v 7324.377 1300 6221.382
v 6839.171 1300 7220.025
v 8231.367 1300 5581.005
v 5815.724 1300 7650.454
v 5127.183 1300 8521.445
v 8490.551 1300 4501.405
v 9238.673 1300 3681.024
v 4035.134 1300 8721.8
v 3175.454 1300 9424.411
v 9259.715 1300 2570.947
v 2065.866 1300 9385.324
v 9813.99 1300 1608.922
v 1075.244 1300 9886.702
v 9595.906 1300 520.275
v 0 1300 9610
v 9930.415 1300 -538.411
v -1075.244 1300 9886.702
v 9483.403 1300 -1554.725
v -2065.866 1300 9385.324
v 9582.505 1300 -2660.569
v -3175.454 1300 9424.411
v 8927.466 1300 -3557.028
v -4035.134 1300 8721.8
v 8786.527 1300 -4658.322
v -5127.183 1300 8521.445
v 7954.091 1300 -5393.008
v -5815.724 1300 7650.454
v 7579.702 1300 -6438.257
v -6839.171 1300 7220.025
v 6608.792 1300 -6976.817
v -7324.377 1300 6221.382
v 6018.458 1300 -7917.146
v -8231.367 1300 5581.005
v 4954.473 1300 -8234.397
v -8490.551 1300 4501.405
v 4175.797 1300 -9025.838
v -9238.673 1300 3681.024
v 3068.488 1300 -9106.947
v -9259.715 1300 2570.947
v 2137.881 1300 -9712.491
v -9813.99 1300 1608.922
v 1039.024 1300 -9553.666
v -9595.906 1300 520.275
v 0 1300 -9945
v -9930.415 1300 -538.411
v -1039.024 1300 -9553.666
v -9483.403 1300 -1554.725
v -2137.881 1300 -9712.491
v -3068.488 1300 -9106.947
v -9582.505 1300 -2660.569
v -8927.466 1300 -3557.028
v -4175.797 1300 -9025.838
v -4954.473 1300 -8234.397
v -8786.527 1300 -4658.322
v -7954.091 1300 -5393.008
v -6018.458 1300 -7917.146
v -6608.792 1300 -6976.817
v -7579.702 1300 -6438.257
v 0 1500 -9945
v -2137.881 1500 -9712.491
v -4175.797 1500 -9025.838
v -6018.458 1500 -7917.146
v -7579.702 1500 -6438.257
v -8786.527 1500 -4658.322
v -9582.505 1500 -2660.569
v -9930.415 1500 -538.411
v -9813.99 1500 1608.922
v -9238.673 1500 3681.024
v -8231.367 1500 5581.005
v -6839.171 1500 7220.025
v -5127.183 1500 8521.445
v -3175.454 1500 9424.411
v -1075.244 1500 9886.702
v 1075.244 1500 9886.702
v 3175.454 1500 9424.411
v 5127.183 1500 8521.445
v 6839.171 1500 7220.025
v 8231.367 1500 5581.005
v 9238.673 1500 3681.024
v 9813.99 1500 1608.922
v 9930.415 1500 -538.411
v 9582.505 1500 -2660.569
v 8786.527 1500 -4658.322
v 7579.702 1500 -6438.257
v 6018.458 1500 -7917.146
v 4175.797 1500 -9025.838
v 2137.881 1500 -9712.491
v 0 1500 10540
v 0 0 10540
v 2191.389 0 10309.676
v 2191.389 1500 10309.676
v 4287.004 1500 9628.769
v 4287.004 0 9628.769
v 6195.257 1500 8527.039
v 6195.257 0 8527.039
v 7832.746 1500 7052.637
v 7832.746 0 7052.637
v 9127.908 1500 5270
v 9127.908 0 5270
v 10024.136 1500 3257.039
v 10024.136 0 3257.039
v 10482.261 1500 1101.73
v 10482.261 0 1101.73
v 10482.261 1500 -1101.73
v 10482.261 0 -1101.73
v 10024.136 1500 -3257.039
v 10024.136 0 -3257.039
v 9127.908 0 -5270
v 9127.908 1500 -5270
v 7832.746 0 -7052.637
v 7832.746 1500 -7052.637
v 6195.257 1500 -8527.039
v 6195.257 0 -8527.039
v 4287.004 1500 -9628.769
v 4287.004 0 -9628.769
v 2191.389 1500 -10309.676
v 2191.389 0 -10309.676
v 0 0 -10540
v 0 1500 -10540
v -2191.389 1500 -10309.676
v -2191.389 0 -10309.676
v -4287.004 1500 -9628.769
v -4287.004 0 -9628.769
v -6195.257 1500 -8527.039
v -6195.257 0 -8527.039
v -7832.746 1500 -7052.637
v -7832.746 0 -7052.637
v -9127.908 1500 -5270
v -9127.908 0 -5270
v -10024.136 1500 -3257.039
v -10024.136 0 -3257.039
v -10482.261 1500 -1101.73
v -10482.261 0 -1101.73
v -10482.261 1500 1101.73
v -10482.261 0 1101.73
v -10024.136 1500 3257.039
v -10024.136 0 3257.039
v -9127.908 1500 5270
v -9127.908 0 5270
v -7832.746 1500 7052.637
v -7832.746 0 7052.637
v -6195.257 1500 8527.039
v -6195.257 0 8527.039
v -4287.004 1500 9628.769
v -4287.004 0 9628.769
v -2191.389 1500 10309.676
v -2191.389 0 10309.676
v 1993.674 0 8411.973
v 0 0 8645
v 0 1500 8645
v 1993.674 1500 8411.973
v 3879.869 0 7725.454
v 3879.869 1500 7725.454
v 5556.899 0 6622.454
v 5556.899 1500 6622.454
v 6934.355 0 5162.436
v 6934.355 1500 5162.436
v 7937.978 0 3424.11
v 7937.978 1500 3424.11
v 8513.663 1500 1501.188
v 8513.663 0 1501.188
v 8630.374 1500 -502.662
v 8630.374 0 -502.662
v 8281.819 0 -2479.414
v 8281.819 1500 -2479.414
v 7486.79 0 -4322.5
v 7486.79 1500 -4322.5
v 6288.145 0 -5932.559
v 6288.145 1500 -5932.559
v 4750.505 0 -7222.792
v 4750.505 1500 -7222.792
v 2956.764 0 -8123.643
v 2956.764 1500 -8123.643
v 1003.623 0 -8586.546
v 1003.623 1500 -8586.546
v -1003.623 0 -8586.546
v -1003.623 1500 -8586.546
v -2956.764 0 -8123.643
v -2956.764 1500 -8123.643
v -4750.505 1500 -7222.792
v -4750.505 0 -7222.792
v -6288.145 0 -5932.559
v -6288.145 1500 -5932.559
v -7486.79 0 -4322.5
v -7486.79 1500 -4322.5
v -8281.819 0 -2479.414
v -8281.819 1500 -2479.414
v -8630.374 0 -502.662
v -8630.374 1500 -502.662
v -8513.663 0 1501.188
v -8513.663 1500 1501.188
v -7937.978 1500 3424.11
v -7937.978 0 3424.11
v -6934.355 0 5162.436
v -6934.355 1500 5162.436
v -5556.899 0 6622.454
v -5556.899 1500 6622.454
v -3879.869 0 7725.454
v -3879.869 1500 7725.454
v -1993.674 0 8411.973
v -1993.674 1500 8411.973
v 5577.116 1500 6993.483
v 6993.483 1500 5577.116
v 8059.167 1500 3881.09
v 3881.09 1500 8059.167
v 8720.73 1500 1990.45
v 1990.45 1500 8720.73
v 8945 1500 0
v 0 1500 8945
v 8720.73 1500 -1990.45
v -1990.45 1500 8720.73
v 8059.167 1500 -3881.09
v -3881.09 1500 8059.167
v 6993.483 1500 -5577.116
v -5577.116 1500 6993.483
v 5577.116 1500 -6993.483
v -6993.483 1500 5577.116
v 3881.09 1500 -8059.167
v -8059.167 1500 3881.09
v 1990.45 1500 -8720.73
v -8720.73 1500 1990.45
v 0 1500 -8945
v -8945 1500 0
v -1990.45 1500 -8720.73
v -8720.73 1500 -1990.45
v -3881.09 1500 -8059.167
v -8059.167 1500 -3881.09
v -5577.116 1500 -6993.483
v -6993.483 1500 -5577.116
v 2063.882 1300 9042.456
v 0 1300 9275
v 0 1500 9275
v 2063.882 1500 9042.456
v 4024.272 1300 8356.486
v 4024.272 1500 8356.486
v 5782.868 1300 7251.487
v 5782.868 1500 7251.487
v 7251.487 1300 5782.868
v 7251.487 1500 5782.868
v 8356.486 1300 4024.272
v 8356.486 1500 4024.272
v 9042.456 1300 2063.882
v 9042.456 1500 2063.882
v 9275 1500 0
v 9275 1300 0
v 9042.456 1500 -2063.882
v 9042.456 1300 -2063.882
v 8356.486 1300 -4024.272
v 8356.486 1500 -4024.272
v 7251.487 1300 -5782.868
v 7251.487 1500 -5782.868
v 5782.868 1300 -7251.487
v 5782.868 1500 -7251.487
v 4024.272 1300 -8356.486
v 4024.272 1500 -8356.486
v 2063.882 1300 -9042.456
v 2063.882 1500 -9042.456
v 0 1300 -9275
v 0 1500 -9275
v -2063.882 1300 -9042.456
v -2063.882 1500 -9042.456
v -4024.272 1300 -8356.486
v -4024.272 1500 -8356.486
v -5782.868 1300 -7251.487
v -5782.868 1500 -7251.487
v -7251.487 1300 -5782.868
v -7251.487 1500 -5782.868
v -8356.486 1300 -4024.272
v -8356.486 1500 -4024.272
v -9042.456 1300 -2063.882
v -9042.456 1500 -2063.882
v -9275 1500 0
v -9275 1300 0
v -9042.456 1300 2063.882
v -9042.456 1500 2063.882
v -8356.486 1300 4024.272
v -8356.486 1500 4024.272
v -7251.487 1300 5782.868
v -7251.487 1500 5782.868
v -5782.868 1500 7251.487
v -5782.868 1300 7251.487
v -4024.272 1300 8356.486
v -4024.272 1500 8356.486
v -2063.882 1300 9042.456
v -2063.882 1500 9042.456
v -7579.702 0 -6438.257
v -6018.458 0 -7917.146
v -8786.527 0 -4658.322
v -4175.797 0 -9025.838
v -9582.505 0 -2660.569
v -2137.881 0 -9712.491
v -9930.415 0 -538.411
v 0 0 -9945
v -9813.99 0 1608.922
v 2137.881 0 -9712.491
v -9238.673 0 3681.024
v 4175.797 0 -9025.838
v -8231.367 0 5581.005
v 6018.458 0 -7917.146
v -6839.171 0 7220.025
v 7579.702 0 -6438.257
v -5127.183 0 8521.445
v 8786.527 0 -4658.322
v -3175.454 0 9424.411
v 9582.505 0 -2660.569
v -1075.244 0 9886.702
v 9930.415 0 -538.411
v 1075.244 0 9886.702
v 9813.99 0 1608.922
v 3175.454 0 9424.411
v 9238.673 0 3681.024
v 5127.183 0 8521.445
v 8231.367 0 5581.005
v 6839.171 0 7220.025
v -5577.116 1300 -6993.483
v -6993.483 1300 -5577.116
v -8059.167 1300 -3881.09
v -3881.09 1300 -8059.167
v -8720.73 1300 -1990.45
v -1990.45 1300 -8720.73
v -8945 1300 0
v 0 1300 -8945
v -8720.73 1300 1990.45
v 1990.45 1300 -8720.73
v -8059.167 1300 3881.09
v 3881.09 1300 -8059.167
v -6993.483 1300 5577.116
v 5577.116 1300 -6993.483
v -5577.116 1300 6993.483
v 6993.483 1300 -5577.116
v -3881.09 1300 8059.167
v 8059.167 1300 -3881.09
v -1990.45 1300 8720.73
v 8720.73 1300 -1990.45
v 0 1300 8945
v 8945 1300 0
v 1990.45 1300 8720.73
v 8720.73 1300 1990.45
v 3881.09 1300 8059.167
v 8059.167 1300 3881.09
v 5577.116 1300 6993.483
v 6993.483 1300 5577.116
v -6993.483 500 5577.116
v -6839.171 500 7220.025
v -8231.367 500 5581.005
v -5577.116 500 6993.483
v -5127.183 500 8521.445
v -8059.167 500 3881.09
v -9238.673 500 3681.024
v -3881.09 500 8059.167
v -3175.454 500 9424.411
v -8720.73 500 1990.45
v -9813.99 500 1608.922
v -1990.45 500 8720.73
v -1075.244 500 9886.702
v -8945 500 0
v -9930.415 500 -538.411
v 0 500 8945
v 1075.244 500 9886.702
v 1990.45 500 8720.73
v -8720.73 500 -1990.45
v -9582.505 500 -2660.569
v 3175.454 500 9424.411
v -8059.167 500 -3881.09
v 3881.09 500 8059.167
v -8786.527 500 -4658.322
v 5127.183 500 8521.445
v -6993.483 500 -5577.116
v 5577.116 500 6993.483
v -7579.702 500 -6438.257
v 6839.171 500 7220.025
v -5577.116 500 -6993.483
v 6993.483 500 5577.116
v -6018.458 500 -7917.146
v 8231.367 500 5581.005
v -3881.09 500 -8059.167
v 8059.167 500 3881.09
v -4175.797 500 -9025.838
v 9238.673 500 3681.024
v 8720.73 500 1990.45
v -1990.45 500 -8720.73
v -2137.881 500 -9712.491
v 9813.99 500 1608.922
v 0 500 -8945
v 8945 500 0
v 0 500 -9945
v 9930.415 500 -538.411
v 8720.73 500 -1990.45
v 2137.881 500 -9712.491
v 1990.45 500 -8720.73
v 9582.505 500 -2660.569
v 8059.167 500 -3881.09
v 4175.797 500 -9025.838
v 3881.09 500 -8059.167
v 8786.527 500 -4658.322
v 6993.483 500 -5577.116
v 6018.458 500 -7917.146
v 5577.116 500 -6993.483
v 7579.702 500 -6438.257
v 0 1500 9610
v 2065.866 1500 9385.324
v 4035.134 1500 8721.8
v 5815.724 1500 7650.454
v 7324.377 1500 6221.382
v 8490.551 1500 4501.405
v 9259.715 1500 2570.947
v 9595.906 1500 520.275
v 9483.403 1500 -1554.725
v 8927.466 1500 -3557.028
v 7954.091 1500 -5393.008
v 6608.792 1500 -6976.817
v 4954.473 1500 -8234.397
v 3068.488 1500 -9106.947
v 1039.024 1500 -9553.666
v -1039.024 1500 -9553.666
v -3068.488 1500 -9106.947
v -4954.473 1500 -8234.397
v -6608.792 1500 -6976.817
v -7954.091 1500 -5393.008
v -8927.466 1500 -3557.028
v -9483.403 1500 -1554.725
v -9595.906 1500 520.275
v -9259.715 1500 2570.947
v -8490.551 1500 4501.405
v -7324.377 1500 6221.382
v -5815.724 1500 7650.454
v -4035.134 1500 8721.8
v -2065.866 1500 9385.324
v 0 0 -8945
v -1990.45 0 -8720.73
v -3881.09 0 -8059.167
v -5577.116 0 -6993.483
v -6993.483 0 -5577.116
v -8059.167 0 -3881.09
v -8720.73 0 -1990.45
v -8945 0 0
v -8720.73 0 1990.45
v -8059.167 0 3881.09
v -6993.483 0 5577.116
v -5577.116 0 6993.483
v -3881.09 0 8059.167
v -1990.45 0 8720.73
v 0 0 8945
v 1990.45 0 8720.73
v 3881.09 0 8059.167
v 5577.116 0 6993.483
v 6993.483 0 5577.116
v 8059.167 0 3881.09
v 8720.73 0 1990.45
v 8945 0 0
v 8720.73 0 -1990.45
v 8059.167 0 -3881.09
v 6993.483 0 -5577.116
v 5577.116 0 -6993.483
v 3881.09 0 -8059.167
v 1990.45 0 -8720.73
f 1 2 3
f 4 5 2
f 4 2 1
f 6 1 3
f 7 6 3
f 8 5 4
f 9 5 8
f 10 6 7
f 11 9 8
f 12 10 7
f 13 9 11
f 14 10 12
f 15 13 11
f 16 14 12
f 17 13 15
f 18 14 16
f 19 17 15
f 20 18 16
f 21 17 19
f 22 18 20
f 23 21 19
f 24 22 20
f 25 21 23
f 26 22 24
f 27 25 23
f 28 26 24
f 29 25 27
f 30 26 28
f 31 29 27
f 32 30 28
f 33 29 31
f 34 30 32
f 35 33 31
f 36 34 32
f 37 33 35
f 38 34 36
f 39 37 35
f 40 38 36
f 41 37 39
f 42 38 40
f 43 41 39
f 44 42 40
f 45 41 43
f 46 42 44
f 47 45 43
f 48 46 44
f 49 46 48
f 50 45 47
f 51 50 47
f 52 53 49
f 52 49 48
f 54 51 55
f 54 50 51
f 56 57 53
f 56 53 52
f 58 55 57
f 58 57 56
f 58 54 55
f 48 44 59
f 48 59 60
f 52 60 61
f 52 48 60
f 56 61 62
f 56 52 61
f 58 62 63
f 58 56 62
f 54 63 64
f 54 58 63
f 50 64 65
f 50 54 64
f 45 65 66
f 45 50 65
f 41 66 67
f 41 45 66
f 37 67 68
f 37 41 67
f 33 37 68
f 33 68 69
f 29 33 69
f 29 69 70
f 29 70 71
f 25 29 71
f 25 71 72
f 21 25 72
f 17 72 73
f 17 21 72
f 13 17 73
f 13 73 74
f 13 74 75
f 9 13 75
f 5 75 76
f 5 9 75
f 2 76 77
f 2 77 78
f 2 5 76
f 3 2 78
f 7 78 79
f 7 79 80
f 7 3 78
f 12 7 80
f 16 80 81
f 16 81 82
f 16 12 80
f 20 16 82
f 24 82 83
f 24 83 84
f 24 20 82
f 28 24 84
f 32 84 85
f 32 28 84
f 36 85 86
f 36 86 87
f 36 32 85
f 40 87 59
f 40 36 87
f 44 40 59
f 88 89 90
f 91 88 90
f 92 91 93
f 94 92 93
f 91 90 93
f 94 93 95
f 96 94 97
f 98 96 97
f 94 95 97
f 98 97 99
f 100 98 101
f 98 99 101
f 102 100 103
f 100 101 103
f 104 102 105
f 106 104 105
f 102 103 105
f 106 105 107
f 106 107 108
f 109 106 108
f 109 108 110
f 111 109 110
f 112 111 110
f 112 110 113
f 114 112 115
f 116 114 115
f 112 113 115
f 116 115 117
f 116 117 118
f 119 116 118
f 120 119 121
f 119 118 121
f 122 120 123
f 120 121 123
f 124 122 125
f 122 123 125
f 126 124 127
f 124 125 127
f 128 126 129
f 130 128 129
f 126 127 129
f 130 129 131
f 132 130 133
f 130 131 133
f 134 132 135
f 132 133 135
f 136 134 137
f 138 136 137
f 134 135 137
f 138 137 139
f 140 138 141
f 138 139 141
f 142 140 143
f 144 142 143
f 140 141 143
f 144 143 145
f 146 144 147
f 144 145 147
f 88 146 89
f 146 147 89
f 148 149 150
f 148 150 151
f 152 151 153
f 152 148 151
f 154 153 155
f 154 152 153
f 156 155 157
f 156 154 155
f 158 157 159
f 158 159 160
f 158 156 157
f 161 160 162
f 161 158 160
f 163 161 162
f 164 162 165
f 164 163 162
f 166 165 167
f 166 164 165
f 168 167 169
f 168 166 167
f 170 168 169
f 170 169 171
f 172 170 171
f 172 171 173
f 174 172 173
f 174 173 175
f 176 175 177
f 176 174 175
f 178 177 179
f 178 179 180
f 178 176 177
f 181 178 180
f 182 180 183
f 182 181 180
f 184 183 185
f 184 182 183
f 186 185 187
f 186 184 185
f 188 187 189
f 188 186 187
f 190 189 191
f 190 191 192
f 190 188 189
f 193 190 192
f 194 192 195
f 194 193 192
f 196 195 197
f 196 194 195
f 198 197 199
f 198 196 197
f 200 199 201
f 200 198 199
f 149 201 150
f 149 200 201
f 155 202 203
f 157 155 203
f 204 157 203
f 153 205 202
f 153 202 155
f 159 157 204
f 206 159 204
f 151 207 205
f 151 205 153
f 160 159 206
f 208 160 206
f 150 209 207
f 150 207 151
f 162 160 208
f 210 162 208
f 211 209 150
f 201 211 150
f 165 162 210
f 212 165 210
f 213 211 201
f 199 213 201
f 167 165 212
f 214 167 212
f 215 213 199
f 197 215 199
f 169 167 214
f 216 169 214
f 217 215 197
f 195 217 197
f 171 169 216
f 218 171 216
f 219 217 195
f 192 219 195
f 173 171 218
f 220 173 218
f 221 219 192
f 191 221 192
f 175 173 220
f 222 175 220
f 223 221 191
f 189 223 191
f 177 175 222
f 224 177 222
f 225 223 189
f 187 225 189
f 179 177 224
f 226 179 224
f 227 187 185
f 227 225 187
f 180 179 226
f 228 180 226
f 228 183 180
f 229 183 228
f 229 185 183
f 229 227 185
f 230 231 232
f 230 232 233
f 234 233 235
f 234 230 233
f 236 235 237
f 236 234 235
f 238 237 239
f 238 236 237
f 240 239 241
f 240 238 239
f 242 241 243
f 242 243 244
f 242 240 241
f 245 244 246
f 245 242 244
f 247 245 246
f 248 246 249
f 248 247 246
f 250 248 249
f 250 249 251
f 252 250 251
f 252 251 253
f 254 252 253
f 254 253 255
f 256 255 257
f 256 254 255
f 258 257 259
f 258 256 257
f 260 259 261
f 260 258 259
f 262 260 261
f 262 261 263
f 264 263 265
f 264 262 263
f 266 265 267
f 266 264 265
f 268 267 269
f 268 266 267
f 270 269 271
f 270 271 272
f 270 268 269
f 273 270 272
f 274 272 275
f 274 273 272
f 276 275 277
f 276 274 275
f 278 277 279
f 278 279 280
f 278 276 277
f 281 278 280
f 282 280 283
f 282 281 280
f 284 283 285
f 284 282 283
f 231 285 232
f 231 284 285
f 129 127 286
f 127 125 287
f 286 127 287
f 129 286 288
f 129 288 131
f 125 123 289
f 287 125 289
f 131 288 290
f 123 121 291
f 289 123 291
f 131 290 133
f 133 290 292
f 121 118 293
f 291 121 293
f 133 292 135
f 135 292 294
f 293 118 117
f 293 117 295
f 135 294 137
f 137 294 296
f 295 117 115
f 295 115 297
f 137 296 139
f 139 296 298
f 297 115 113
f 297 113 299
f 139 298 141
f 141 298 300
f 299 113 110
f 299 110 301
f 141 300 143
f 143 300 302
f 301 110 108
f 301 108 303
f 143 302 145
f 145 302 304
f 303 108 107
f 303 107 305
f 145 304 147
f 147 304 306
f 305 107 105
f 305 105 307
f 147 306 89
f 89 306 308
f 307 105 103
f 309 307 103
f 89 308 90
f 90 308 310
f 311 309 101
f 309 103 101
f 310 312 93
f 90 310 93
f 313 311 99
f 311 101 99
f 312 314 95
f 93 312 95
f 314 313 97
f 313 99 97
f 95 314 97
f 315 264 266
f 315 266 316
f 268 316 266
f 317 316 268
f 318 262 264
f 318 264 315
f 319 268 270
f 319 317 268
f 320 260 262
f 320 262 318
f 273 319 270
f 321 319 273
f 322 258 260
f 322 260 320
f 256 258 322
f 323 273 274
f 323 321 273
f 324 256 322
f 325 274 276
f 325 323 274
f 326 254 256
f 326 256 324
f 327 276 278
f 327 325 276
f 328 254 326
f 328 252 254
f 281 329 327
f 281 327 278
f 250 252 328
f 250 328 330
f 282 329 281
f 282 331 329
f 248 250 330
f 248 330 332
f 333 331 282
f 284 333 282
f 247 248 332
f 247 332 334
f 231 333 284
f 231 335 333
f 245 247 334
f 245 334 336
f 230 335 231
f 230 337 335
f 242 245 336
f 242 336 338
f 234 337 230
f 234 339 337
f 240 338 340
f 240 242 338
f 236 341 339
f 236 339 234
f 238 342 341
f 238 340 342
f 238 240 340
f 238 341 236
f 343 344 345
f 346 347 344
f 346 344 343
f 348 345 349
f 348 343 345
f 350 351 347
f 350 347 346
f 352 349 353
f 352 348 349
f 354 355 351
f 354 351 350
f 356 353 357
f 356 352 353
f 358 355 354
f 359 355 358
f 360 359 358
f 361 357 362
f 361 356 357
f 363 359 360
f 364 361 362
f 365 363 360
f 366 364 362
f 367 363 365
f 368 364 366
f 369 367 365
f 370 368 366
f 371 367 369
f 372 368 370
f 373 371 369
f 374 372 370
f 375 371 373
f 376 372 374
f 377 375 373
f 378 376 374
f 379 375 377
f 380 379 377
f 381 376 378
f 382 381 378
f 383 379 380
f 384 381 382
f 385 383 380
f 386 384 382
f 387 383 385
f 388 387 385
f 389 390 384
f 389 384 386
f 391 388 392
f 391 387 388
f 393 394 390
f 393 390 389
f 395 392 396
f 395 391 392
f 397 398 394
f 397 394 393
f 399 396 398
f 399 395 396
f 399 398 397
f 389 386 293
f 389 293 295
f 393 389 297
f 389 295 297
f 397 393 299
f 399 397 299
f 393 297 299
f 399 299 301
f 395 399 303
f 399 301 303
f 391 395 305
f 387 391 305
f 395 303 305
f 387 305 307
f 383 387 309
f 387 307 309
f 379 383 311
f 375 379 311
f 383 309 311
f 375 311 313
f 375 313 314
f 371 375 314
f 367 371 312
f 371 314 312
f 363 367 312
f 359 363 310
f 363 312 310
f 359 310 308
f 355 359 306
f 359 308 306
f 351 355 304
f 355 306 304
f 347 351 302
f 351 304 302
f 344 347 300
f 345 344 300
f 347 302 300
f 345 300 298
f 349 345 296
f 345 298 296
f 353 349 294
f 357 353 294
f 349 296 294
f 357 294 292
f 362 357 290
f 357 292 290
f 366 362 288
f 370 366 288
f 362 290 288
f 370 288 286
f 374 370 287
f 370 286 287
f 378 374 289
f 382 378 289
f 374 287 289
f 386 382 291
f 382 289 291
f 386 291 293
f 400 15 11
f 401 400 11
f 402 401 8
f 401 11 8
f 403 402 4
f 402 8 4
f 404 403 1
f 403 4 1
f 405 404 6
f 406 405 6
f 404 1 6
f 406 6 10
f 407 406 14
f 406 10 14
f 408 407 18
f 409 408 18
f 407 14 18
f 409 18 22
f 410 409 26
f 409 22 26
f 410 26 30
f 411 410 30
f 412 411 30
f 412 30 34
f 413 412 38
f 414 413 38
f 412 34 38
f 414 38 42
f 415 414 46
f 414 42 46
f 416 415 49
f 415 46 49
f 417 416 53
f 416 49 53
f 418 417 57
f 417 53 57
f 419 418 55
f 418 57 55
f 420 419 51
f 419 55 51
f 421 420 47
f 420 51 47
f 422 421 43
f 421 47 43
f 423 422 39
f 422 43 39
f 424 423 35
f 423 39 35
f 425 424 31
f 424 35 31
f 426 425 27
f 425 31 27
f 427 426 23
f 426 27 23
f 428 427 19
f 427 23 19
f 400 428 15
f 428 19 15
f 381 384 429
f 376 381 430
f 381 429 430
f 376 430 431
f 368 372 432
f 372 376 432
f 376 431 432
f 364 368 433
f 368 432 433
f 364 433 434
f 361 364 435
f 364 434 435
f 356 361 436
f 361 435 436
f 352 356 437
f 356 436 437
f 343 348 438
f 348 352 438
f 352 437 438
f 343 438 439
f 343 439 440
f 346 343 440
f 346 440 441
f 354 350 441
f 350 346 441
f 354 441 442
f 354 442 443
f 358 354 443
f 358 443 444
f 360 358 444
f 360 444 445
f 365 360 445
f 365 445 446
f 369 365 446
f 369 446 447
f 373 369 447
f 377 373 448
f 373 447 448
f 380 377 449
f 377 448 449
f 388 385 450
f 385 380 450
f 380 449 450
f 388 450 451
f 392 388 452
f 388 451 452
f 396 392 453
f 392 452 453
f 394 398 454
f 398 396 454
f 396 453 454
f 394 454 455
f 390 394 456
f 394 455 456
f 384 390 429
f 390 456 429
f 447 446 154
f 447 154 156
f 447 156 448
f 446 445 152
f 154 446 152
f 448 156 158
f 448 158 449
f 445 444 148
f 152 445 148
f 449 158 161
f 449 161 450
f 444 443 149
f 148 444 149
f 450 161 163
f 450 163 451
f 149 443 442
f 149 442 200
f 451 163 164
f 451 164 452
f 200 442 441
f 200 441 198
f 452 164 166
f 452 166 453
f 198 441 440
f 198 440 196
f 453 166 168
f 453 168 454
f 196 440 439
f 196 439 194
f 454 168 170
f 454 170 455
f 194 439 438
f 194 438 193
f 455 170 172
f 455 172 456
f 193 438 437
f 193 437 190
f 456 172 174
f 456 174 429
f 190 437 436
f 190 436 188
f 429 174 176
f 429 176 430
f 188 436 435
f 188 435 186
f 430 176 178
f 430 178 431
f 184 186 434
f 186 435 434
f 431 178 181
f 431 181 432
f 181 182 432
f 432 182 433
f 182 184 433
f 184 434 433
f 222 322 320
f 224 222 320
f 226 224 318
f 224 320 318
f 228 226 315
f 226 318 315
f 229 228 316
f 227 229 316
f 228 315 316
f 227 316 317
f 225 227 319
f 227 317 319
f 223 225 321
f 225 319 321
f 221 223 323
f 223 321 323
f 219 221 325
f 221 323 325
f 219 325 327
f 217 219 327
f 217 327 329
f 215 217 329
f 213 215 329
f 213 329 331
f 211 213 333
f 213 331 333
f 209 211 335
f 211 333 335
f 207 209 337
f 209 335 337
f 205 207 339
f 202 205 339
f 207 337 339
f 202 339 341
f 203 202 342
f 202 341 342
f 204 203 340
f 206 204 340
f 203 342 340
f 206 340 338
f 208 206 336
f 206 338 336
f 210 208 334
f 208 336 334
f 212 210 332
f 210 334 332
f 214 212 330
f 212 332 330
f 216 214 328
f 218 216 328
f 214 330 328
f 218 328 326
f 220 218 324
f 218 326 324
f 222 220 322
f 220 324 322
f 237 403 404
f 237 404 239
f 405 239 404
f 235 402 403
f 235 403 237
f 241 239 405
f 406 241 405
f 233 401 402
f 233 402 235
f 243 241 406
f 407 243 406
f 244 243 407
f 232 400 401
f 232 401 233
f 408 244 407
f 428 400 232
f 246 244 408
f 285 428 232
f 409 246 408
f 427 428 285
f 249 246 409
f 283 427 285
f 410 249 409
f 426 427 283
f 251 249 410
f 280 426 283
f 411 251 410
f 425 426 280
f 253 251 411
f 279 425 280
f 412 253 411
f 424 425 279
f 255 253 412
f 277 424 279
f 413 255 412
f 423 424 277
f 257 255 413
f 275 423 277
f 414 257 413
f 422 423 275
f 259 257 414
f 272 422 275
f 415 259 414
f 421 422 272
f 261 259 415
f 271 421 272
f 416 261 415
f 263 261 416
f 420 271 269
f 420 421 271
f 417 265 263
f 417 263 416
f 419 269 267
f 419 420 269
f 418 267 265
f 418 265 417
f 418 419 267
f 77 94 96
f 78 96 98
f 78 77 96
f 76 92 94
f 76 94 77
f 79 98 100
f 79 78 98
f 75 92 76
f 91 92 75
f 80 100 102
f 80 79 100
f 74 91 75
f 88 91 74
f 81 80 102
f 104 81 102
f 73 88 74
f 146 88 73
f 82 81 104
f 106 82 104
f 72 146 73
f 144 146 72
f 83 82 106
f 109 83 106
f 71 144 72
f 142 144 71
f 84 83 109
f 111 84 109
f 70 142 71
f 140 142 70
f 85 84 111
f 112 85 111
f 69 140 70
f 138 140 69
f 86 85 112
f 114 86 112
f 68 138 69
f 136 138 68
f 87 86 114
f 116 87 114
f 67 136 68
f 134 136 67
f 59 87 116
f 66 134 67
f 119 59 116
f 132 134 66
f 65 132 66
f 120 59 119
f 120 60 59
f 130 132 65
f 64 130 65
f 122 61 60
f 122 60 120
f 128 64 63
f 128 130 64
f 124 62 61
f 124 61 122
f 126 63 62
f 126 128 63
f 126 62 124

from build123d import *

# Parameters (mm, degrees)
SKETCH1_R           = 9945
SKETCH1_R_2         = 8945
BOSS_EXTRUDE1_DEPTH = 600
SKETCH2_R           = 10540
SKETCH2_R_2         = 8945
BOSS_EXTRUDE2_DEPTH = 1500
SKETCH3_R           = 9945
SKETCH3_R_2         = 8945
CUT_EXTRUDE1_DEPTH  = 500
SKETCH4_R           = 8945
SKETCH4_R_2         = 8645
BOSS_EXTRUDE3_DEPTH = 1500
CUT_EXTRUDE2_START  = -200
SKETCH5_R           = 9275
SKETCH5_R_2         = 8945
CUT_EXTRUDE2_DEPTH  = 200
CUT_EXTRUDE3_START  = -200
SKETCH6_R           = 9945
SKETCH6_R_2         = 9610
CUT_EXTRUDE3_DEPTH  = 200


with BuildPart() as part:
    # Sketch1 → Boss-Extrude1 (new body)
    with BuildSketch(Plane(origin=(0, 0, 0), x_dir=(1, 0, 0), z_dir=(0, 1, 0))):
        with Locations(Location((0, 0, 0), (0, 0, 270))):
            Circle(SKETCH1_R)
        with Locations(Location((0, 0, 0), (0, 0, 270))):
            Circle(SKETCH1_R_2, mode=Mode.SUBTRACT)
    extrude(amount=BOSS_EXTRUDE1_DEPTH)

    # Sketch2 → Boss-Extrude2 (add)
    with BuildSketch(Plane(origin=(0, 0, 0), x_dir=(1, 0, 0), z_dir=(0, 1, 0))):
        with Locations(Location((0, 0, 0), (0, 0, 270))):
            Circle(SKETCH2_R)
        with Locations(Location((0, 0, 0), (0, 0, 270))):
            Circle(SKETCH2_R_2, mode=Mode.SUBTRACT)
    extrude(amount=BOSS_EXTRUDE2_DEPTH)

    # Sketch3 → Cut-Extrude1 (cut)
    with BuildSketch(Plane.XZ):
        with Locations(Location((0, 0, 0), (0, 0, 270))):
            Circle(SKETCH3_R)
        with Locations(Location((0, 0, 0), (0, 0, 270))):
            Circle(SKETCH3_R_2, mode=Mode.SUBTRACT)
    extrude(amount=-CUT_EXTRUDE1_DEPTH, mode=Mode.SUBTRACT)

    # Sketch4 → Boss-Extrude3 (add)
    with BuildSketch(Plane(origin=(0, 0, 0), x_dir=(1, 0, 0), z_dir=(0, 1, 0))):
        with Locations(Location((0, 0, 0), (0, 0, 90))):
            Circle(SKETCH4_R)
        with Locations(Location((0, 0, 0), (0, 0, 270))):
            Circle(SKETCH4_R_2, mode=Mode.SUBTRACT)
    extrude(amount=BOSS_EXTRUDE3_DEPTH)

    # Sketch5 → Cut-Extrude2 (cut)
    with BuildSketch(Plane(origin=(0, 1500, 0), x_dir=(1, 0, 0), z_dir=(0, 1, 0)).offset(CUT_EXTRUDE2_START)):
        with Locations(Location((0, 0, 0), (0, 0, 270))):
            Circle(SKETCH5_R)
        with Locations(Location((0, 0, 0), (0, 0, 90))):
            Circle(SKETCH5_R_2, mode=Mode.SUBTRACT)
    extrude(amount=CUT_EXTRUDE2_DEPTH, mode=Mode.SUBTRACT)

    # Sketch6 → Cut-Extrude3 (cut)
    with BuildSketch(Plane(origin=(0, 1500, 0), x_dir=(1, 0, 0), z_dir=(0, 1, 0)).offset(CUT_EXTRUDE3_START)):
        with Locations(Location((0, 0, 0), (0, 0, 90))):
            Circle(SKETCH6_R)
        with Locations(Location((0, 0, 0), (0, 0, 270))):
            Circle(SKETCH6_R_2, mode=Mode.SUBTRACT)
    extrude(amount=CUT_EXTRUDE3_DEPTH, mode=Mode.SUBTRACT)


solid = part.part
